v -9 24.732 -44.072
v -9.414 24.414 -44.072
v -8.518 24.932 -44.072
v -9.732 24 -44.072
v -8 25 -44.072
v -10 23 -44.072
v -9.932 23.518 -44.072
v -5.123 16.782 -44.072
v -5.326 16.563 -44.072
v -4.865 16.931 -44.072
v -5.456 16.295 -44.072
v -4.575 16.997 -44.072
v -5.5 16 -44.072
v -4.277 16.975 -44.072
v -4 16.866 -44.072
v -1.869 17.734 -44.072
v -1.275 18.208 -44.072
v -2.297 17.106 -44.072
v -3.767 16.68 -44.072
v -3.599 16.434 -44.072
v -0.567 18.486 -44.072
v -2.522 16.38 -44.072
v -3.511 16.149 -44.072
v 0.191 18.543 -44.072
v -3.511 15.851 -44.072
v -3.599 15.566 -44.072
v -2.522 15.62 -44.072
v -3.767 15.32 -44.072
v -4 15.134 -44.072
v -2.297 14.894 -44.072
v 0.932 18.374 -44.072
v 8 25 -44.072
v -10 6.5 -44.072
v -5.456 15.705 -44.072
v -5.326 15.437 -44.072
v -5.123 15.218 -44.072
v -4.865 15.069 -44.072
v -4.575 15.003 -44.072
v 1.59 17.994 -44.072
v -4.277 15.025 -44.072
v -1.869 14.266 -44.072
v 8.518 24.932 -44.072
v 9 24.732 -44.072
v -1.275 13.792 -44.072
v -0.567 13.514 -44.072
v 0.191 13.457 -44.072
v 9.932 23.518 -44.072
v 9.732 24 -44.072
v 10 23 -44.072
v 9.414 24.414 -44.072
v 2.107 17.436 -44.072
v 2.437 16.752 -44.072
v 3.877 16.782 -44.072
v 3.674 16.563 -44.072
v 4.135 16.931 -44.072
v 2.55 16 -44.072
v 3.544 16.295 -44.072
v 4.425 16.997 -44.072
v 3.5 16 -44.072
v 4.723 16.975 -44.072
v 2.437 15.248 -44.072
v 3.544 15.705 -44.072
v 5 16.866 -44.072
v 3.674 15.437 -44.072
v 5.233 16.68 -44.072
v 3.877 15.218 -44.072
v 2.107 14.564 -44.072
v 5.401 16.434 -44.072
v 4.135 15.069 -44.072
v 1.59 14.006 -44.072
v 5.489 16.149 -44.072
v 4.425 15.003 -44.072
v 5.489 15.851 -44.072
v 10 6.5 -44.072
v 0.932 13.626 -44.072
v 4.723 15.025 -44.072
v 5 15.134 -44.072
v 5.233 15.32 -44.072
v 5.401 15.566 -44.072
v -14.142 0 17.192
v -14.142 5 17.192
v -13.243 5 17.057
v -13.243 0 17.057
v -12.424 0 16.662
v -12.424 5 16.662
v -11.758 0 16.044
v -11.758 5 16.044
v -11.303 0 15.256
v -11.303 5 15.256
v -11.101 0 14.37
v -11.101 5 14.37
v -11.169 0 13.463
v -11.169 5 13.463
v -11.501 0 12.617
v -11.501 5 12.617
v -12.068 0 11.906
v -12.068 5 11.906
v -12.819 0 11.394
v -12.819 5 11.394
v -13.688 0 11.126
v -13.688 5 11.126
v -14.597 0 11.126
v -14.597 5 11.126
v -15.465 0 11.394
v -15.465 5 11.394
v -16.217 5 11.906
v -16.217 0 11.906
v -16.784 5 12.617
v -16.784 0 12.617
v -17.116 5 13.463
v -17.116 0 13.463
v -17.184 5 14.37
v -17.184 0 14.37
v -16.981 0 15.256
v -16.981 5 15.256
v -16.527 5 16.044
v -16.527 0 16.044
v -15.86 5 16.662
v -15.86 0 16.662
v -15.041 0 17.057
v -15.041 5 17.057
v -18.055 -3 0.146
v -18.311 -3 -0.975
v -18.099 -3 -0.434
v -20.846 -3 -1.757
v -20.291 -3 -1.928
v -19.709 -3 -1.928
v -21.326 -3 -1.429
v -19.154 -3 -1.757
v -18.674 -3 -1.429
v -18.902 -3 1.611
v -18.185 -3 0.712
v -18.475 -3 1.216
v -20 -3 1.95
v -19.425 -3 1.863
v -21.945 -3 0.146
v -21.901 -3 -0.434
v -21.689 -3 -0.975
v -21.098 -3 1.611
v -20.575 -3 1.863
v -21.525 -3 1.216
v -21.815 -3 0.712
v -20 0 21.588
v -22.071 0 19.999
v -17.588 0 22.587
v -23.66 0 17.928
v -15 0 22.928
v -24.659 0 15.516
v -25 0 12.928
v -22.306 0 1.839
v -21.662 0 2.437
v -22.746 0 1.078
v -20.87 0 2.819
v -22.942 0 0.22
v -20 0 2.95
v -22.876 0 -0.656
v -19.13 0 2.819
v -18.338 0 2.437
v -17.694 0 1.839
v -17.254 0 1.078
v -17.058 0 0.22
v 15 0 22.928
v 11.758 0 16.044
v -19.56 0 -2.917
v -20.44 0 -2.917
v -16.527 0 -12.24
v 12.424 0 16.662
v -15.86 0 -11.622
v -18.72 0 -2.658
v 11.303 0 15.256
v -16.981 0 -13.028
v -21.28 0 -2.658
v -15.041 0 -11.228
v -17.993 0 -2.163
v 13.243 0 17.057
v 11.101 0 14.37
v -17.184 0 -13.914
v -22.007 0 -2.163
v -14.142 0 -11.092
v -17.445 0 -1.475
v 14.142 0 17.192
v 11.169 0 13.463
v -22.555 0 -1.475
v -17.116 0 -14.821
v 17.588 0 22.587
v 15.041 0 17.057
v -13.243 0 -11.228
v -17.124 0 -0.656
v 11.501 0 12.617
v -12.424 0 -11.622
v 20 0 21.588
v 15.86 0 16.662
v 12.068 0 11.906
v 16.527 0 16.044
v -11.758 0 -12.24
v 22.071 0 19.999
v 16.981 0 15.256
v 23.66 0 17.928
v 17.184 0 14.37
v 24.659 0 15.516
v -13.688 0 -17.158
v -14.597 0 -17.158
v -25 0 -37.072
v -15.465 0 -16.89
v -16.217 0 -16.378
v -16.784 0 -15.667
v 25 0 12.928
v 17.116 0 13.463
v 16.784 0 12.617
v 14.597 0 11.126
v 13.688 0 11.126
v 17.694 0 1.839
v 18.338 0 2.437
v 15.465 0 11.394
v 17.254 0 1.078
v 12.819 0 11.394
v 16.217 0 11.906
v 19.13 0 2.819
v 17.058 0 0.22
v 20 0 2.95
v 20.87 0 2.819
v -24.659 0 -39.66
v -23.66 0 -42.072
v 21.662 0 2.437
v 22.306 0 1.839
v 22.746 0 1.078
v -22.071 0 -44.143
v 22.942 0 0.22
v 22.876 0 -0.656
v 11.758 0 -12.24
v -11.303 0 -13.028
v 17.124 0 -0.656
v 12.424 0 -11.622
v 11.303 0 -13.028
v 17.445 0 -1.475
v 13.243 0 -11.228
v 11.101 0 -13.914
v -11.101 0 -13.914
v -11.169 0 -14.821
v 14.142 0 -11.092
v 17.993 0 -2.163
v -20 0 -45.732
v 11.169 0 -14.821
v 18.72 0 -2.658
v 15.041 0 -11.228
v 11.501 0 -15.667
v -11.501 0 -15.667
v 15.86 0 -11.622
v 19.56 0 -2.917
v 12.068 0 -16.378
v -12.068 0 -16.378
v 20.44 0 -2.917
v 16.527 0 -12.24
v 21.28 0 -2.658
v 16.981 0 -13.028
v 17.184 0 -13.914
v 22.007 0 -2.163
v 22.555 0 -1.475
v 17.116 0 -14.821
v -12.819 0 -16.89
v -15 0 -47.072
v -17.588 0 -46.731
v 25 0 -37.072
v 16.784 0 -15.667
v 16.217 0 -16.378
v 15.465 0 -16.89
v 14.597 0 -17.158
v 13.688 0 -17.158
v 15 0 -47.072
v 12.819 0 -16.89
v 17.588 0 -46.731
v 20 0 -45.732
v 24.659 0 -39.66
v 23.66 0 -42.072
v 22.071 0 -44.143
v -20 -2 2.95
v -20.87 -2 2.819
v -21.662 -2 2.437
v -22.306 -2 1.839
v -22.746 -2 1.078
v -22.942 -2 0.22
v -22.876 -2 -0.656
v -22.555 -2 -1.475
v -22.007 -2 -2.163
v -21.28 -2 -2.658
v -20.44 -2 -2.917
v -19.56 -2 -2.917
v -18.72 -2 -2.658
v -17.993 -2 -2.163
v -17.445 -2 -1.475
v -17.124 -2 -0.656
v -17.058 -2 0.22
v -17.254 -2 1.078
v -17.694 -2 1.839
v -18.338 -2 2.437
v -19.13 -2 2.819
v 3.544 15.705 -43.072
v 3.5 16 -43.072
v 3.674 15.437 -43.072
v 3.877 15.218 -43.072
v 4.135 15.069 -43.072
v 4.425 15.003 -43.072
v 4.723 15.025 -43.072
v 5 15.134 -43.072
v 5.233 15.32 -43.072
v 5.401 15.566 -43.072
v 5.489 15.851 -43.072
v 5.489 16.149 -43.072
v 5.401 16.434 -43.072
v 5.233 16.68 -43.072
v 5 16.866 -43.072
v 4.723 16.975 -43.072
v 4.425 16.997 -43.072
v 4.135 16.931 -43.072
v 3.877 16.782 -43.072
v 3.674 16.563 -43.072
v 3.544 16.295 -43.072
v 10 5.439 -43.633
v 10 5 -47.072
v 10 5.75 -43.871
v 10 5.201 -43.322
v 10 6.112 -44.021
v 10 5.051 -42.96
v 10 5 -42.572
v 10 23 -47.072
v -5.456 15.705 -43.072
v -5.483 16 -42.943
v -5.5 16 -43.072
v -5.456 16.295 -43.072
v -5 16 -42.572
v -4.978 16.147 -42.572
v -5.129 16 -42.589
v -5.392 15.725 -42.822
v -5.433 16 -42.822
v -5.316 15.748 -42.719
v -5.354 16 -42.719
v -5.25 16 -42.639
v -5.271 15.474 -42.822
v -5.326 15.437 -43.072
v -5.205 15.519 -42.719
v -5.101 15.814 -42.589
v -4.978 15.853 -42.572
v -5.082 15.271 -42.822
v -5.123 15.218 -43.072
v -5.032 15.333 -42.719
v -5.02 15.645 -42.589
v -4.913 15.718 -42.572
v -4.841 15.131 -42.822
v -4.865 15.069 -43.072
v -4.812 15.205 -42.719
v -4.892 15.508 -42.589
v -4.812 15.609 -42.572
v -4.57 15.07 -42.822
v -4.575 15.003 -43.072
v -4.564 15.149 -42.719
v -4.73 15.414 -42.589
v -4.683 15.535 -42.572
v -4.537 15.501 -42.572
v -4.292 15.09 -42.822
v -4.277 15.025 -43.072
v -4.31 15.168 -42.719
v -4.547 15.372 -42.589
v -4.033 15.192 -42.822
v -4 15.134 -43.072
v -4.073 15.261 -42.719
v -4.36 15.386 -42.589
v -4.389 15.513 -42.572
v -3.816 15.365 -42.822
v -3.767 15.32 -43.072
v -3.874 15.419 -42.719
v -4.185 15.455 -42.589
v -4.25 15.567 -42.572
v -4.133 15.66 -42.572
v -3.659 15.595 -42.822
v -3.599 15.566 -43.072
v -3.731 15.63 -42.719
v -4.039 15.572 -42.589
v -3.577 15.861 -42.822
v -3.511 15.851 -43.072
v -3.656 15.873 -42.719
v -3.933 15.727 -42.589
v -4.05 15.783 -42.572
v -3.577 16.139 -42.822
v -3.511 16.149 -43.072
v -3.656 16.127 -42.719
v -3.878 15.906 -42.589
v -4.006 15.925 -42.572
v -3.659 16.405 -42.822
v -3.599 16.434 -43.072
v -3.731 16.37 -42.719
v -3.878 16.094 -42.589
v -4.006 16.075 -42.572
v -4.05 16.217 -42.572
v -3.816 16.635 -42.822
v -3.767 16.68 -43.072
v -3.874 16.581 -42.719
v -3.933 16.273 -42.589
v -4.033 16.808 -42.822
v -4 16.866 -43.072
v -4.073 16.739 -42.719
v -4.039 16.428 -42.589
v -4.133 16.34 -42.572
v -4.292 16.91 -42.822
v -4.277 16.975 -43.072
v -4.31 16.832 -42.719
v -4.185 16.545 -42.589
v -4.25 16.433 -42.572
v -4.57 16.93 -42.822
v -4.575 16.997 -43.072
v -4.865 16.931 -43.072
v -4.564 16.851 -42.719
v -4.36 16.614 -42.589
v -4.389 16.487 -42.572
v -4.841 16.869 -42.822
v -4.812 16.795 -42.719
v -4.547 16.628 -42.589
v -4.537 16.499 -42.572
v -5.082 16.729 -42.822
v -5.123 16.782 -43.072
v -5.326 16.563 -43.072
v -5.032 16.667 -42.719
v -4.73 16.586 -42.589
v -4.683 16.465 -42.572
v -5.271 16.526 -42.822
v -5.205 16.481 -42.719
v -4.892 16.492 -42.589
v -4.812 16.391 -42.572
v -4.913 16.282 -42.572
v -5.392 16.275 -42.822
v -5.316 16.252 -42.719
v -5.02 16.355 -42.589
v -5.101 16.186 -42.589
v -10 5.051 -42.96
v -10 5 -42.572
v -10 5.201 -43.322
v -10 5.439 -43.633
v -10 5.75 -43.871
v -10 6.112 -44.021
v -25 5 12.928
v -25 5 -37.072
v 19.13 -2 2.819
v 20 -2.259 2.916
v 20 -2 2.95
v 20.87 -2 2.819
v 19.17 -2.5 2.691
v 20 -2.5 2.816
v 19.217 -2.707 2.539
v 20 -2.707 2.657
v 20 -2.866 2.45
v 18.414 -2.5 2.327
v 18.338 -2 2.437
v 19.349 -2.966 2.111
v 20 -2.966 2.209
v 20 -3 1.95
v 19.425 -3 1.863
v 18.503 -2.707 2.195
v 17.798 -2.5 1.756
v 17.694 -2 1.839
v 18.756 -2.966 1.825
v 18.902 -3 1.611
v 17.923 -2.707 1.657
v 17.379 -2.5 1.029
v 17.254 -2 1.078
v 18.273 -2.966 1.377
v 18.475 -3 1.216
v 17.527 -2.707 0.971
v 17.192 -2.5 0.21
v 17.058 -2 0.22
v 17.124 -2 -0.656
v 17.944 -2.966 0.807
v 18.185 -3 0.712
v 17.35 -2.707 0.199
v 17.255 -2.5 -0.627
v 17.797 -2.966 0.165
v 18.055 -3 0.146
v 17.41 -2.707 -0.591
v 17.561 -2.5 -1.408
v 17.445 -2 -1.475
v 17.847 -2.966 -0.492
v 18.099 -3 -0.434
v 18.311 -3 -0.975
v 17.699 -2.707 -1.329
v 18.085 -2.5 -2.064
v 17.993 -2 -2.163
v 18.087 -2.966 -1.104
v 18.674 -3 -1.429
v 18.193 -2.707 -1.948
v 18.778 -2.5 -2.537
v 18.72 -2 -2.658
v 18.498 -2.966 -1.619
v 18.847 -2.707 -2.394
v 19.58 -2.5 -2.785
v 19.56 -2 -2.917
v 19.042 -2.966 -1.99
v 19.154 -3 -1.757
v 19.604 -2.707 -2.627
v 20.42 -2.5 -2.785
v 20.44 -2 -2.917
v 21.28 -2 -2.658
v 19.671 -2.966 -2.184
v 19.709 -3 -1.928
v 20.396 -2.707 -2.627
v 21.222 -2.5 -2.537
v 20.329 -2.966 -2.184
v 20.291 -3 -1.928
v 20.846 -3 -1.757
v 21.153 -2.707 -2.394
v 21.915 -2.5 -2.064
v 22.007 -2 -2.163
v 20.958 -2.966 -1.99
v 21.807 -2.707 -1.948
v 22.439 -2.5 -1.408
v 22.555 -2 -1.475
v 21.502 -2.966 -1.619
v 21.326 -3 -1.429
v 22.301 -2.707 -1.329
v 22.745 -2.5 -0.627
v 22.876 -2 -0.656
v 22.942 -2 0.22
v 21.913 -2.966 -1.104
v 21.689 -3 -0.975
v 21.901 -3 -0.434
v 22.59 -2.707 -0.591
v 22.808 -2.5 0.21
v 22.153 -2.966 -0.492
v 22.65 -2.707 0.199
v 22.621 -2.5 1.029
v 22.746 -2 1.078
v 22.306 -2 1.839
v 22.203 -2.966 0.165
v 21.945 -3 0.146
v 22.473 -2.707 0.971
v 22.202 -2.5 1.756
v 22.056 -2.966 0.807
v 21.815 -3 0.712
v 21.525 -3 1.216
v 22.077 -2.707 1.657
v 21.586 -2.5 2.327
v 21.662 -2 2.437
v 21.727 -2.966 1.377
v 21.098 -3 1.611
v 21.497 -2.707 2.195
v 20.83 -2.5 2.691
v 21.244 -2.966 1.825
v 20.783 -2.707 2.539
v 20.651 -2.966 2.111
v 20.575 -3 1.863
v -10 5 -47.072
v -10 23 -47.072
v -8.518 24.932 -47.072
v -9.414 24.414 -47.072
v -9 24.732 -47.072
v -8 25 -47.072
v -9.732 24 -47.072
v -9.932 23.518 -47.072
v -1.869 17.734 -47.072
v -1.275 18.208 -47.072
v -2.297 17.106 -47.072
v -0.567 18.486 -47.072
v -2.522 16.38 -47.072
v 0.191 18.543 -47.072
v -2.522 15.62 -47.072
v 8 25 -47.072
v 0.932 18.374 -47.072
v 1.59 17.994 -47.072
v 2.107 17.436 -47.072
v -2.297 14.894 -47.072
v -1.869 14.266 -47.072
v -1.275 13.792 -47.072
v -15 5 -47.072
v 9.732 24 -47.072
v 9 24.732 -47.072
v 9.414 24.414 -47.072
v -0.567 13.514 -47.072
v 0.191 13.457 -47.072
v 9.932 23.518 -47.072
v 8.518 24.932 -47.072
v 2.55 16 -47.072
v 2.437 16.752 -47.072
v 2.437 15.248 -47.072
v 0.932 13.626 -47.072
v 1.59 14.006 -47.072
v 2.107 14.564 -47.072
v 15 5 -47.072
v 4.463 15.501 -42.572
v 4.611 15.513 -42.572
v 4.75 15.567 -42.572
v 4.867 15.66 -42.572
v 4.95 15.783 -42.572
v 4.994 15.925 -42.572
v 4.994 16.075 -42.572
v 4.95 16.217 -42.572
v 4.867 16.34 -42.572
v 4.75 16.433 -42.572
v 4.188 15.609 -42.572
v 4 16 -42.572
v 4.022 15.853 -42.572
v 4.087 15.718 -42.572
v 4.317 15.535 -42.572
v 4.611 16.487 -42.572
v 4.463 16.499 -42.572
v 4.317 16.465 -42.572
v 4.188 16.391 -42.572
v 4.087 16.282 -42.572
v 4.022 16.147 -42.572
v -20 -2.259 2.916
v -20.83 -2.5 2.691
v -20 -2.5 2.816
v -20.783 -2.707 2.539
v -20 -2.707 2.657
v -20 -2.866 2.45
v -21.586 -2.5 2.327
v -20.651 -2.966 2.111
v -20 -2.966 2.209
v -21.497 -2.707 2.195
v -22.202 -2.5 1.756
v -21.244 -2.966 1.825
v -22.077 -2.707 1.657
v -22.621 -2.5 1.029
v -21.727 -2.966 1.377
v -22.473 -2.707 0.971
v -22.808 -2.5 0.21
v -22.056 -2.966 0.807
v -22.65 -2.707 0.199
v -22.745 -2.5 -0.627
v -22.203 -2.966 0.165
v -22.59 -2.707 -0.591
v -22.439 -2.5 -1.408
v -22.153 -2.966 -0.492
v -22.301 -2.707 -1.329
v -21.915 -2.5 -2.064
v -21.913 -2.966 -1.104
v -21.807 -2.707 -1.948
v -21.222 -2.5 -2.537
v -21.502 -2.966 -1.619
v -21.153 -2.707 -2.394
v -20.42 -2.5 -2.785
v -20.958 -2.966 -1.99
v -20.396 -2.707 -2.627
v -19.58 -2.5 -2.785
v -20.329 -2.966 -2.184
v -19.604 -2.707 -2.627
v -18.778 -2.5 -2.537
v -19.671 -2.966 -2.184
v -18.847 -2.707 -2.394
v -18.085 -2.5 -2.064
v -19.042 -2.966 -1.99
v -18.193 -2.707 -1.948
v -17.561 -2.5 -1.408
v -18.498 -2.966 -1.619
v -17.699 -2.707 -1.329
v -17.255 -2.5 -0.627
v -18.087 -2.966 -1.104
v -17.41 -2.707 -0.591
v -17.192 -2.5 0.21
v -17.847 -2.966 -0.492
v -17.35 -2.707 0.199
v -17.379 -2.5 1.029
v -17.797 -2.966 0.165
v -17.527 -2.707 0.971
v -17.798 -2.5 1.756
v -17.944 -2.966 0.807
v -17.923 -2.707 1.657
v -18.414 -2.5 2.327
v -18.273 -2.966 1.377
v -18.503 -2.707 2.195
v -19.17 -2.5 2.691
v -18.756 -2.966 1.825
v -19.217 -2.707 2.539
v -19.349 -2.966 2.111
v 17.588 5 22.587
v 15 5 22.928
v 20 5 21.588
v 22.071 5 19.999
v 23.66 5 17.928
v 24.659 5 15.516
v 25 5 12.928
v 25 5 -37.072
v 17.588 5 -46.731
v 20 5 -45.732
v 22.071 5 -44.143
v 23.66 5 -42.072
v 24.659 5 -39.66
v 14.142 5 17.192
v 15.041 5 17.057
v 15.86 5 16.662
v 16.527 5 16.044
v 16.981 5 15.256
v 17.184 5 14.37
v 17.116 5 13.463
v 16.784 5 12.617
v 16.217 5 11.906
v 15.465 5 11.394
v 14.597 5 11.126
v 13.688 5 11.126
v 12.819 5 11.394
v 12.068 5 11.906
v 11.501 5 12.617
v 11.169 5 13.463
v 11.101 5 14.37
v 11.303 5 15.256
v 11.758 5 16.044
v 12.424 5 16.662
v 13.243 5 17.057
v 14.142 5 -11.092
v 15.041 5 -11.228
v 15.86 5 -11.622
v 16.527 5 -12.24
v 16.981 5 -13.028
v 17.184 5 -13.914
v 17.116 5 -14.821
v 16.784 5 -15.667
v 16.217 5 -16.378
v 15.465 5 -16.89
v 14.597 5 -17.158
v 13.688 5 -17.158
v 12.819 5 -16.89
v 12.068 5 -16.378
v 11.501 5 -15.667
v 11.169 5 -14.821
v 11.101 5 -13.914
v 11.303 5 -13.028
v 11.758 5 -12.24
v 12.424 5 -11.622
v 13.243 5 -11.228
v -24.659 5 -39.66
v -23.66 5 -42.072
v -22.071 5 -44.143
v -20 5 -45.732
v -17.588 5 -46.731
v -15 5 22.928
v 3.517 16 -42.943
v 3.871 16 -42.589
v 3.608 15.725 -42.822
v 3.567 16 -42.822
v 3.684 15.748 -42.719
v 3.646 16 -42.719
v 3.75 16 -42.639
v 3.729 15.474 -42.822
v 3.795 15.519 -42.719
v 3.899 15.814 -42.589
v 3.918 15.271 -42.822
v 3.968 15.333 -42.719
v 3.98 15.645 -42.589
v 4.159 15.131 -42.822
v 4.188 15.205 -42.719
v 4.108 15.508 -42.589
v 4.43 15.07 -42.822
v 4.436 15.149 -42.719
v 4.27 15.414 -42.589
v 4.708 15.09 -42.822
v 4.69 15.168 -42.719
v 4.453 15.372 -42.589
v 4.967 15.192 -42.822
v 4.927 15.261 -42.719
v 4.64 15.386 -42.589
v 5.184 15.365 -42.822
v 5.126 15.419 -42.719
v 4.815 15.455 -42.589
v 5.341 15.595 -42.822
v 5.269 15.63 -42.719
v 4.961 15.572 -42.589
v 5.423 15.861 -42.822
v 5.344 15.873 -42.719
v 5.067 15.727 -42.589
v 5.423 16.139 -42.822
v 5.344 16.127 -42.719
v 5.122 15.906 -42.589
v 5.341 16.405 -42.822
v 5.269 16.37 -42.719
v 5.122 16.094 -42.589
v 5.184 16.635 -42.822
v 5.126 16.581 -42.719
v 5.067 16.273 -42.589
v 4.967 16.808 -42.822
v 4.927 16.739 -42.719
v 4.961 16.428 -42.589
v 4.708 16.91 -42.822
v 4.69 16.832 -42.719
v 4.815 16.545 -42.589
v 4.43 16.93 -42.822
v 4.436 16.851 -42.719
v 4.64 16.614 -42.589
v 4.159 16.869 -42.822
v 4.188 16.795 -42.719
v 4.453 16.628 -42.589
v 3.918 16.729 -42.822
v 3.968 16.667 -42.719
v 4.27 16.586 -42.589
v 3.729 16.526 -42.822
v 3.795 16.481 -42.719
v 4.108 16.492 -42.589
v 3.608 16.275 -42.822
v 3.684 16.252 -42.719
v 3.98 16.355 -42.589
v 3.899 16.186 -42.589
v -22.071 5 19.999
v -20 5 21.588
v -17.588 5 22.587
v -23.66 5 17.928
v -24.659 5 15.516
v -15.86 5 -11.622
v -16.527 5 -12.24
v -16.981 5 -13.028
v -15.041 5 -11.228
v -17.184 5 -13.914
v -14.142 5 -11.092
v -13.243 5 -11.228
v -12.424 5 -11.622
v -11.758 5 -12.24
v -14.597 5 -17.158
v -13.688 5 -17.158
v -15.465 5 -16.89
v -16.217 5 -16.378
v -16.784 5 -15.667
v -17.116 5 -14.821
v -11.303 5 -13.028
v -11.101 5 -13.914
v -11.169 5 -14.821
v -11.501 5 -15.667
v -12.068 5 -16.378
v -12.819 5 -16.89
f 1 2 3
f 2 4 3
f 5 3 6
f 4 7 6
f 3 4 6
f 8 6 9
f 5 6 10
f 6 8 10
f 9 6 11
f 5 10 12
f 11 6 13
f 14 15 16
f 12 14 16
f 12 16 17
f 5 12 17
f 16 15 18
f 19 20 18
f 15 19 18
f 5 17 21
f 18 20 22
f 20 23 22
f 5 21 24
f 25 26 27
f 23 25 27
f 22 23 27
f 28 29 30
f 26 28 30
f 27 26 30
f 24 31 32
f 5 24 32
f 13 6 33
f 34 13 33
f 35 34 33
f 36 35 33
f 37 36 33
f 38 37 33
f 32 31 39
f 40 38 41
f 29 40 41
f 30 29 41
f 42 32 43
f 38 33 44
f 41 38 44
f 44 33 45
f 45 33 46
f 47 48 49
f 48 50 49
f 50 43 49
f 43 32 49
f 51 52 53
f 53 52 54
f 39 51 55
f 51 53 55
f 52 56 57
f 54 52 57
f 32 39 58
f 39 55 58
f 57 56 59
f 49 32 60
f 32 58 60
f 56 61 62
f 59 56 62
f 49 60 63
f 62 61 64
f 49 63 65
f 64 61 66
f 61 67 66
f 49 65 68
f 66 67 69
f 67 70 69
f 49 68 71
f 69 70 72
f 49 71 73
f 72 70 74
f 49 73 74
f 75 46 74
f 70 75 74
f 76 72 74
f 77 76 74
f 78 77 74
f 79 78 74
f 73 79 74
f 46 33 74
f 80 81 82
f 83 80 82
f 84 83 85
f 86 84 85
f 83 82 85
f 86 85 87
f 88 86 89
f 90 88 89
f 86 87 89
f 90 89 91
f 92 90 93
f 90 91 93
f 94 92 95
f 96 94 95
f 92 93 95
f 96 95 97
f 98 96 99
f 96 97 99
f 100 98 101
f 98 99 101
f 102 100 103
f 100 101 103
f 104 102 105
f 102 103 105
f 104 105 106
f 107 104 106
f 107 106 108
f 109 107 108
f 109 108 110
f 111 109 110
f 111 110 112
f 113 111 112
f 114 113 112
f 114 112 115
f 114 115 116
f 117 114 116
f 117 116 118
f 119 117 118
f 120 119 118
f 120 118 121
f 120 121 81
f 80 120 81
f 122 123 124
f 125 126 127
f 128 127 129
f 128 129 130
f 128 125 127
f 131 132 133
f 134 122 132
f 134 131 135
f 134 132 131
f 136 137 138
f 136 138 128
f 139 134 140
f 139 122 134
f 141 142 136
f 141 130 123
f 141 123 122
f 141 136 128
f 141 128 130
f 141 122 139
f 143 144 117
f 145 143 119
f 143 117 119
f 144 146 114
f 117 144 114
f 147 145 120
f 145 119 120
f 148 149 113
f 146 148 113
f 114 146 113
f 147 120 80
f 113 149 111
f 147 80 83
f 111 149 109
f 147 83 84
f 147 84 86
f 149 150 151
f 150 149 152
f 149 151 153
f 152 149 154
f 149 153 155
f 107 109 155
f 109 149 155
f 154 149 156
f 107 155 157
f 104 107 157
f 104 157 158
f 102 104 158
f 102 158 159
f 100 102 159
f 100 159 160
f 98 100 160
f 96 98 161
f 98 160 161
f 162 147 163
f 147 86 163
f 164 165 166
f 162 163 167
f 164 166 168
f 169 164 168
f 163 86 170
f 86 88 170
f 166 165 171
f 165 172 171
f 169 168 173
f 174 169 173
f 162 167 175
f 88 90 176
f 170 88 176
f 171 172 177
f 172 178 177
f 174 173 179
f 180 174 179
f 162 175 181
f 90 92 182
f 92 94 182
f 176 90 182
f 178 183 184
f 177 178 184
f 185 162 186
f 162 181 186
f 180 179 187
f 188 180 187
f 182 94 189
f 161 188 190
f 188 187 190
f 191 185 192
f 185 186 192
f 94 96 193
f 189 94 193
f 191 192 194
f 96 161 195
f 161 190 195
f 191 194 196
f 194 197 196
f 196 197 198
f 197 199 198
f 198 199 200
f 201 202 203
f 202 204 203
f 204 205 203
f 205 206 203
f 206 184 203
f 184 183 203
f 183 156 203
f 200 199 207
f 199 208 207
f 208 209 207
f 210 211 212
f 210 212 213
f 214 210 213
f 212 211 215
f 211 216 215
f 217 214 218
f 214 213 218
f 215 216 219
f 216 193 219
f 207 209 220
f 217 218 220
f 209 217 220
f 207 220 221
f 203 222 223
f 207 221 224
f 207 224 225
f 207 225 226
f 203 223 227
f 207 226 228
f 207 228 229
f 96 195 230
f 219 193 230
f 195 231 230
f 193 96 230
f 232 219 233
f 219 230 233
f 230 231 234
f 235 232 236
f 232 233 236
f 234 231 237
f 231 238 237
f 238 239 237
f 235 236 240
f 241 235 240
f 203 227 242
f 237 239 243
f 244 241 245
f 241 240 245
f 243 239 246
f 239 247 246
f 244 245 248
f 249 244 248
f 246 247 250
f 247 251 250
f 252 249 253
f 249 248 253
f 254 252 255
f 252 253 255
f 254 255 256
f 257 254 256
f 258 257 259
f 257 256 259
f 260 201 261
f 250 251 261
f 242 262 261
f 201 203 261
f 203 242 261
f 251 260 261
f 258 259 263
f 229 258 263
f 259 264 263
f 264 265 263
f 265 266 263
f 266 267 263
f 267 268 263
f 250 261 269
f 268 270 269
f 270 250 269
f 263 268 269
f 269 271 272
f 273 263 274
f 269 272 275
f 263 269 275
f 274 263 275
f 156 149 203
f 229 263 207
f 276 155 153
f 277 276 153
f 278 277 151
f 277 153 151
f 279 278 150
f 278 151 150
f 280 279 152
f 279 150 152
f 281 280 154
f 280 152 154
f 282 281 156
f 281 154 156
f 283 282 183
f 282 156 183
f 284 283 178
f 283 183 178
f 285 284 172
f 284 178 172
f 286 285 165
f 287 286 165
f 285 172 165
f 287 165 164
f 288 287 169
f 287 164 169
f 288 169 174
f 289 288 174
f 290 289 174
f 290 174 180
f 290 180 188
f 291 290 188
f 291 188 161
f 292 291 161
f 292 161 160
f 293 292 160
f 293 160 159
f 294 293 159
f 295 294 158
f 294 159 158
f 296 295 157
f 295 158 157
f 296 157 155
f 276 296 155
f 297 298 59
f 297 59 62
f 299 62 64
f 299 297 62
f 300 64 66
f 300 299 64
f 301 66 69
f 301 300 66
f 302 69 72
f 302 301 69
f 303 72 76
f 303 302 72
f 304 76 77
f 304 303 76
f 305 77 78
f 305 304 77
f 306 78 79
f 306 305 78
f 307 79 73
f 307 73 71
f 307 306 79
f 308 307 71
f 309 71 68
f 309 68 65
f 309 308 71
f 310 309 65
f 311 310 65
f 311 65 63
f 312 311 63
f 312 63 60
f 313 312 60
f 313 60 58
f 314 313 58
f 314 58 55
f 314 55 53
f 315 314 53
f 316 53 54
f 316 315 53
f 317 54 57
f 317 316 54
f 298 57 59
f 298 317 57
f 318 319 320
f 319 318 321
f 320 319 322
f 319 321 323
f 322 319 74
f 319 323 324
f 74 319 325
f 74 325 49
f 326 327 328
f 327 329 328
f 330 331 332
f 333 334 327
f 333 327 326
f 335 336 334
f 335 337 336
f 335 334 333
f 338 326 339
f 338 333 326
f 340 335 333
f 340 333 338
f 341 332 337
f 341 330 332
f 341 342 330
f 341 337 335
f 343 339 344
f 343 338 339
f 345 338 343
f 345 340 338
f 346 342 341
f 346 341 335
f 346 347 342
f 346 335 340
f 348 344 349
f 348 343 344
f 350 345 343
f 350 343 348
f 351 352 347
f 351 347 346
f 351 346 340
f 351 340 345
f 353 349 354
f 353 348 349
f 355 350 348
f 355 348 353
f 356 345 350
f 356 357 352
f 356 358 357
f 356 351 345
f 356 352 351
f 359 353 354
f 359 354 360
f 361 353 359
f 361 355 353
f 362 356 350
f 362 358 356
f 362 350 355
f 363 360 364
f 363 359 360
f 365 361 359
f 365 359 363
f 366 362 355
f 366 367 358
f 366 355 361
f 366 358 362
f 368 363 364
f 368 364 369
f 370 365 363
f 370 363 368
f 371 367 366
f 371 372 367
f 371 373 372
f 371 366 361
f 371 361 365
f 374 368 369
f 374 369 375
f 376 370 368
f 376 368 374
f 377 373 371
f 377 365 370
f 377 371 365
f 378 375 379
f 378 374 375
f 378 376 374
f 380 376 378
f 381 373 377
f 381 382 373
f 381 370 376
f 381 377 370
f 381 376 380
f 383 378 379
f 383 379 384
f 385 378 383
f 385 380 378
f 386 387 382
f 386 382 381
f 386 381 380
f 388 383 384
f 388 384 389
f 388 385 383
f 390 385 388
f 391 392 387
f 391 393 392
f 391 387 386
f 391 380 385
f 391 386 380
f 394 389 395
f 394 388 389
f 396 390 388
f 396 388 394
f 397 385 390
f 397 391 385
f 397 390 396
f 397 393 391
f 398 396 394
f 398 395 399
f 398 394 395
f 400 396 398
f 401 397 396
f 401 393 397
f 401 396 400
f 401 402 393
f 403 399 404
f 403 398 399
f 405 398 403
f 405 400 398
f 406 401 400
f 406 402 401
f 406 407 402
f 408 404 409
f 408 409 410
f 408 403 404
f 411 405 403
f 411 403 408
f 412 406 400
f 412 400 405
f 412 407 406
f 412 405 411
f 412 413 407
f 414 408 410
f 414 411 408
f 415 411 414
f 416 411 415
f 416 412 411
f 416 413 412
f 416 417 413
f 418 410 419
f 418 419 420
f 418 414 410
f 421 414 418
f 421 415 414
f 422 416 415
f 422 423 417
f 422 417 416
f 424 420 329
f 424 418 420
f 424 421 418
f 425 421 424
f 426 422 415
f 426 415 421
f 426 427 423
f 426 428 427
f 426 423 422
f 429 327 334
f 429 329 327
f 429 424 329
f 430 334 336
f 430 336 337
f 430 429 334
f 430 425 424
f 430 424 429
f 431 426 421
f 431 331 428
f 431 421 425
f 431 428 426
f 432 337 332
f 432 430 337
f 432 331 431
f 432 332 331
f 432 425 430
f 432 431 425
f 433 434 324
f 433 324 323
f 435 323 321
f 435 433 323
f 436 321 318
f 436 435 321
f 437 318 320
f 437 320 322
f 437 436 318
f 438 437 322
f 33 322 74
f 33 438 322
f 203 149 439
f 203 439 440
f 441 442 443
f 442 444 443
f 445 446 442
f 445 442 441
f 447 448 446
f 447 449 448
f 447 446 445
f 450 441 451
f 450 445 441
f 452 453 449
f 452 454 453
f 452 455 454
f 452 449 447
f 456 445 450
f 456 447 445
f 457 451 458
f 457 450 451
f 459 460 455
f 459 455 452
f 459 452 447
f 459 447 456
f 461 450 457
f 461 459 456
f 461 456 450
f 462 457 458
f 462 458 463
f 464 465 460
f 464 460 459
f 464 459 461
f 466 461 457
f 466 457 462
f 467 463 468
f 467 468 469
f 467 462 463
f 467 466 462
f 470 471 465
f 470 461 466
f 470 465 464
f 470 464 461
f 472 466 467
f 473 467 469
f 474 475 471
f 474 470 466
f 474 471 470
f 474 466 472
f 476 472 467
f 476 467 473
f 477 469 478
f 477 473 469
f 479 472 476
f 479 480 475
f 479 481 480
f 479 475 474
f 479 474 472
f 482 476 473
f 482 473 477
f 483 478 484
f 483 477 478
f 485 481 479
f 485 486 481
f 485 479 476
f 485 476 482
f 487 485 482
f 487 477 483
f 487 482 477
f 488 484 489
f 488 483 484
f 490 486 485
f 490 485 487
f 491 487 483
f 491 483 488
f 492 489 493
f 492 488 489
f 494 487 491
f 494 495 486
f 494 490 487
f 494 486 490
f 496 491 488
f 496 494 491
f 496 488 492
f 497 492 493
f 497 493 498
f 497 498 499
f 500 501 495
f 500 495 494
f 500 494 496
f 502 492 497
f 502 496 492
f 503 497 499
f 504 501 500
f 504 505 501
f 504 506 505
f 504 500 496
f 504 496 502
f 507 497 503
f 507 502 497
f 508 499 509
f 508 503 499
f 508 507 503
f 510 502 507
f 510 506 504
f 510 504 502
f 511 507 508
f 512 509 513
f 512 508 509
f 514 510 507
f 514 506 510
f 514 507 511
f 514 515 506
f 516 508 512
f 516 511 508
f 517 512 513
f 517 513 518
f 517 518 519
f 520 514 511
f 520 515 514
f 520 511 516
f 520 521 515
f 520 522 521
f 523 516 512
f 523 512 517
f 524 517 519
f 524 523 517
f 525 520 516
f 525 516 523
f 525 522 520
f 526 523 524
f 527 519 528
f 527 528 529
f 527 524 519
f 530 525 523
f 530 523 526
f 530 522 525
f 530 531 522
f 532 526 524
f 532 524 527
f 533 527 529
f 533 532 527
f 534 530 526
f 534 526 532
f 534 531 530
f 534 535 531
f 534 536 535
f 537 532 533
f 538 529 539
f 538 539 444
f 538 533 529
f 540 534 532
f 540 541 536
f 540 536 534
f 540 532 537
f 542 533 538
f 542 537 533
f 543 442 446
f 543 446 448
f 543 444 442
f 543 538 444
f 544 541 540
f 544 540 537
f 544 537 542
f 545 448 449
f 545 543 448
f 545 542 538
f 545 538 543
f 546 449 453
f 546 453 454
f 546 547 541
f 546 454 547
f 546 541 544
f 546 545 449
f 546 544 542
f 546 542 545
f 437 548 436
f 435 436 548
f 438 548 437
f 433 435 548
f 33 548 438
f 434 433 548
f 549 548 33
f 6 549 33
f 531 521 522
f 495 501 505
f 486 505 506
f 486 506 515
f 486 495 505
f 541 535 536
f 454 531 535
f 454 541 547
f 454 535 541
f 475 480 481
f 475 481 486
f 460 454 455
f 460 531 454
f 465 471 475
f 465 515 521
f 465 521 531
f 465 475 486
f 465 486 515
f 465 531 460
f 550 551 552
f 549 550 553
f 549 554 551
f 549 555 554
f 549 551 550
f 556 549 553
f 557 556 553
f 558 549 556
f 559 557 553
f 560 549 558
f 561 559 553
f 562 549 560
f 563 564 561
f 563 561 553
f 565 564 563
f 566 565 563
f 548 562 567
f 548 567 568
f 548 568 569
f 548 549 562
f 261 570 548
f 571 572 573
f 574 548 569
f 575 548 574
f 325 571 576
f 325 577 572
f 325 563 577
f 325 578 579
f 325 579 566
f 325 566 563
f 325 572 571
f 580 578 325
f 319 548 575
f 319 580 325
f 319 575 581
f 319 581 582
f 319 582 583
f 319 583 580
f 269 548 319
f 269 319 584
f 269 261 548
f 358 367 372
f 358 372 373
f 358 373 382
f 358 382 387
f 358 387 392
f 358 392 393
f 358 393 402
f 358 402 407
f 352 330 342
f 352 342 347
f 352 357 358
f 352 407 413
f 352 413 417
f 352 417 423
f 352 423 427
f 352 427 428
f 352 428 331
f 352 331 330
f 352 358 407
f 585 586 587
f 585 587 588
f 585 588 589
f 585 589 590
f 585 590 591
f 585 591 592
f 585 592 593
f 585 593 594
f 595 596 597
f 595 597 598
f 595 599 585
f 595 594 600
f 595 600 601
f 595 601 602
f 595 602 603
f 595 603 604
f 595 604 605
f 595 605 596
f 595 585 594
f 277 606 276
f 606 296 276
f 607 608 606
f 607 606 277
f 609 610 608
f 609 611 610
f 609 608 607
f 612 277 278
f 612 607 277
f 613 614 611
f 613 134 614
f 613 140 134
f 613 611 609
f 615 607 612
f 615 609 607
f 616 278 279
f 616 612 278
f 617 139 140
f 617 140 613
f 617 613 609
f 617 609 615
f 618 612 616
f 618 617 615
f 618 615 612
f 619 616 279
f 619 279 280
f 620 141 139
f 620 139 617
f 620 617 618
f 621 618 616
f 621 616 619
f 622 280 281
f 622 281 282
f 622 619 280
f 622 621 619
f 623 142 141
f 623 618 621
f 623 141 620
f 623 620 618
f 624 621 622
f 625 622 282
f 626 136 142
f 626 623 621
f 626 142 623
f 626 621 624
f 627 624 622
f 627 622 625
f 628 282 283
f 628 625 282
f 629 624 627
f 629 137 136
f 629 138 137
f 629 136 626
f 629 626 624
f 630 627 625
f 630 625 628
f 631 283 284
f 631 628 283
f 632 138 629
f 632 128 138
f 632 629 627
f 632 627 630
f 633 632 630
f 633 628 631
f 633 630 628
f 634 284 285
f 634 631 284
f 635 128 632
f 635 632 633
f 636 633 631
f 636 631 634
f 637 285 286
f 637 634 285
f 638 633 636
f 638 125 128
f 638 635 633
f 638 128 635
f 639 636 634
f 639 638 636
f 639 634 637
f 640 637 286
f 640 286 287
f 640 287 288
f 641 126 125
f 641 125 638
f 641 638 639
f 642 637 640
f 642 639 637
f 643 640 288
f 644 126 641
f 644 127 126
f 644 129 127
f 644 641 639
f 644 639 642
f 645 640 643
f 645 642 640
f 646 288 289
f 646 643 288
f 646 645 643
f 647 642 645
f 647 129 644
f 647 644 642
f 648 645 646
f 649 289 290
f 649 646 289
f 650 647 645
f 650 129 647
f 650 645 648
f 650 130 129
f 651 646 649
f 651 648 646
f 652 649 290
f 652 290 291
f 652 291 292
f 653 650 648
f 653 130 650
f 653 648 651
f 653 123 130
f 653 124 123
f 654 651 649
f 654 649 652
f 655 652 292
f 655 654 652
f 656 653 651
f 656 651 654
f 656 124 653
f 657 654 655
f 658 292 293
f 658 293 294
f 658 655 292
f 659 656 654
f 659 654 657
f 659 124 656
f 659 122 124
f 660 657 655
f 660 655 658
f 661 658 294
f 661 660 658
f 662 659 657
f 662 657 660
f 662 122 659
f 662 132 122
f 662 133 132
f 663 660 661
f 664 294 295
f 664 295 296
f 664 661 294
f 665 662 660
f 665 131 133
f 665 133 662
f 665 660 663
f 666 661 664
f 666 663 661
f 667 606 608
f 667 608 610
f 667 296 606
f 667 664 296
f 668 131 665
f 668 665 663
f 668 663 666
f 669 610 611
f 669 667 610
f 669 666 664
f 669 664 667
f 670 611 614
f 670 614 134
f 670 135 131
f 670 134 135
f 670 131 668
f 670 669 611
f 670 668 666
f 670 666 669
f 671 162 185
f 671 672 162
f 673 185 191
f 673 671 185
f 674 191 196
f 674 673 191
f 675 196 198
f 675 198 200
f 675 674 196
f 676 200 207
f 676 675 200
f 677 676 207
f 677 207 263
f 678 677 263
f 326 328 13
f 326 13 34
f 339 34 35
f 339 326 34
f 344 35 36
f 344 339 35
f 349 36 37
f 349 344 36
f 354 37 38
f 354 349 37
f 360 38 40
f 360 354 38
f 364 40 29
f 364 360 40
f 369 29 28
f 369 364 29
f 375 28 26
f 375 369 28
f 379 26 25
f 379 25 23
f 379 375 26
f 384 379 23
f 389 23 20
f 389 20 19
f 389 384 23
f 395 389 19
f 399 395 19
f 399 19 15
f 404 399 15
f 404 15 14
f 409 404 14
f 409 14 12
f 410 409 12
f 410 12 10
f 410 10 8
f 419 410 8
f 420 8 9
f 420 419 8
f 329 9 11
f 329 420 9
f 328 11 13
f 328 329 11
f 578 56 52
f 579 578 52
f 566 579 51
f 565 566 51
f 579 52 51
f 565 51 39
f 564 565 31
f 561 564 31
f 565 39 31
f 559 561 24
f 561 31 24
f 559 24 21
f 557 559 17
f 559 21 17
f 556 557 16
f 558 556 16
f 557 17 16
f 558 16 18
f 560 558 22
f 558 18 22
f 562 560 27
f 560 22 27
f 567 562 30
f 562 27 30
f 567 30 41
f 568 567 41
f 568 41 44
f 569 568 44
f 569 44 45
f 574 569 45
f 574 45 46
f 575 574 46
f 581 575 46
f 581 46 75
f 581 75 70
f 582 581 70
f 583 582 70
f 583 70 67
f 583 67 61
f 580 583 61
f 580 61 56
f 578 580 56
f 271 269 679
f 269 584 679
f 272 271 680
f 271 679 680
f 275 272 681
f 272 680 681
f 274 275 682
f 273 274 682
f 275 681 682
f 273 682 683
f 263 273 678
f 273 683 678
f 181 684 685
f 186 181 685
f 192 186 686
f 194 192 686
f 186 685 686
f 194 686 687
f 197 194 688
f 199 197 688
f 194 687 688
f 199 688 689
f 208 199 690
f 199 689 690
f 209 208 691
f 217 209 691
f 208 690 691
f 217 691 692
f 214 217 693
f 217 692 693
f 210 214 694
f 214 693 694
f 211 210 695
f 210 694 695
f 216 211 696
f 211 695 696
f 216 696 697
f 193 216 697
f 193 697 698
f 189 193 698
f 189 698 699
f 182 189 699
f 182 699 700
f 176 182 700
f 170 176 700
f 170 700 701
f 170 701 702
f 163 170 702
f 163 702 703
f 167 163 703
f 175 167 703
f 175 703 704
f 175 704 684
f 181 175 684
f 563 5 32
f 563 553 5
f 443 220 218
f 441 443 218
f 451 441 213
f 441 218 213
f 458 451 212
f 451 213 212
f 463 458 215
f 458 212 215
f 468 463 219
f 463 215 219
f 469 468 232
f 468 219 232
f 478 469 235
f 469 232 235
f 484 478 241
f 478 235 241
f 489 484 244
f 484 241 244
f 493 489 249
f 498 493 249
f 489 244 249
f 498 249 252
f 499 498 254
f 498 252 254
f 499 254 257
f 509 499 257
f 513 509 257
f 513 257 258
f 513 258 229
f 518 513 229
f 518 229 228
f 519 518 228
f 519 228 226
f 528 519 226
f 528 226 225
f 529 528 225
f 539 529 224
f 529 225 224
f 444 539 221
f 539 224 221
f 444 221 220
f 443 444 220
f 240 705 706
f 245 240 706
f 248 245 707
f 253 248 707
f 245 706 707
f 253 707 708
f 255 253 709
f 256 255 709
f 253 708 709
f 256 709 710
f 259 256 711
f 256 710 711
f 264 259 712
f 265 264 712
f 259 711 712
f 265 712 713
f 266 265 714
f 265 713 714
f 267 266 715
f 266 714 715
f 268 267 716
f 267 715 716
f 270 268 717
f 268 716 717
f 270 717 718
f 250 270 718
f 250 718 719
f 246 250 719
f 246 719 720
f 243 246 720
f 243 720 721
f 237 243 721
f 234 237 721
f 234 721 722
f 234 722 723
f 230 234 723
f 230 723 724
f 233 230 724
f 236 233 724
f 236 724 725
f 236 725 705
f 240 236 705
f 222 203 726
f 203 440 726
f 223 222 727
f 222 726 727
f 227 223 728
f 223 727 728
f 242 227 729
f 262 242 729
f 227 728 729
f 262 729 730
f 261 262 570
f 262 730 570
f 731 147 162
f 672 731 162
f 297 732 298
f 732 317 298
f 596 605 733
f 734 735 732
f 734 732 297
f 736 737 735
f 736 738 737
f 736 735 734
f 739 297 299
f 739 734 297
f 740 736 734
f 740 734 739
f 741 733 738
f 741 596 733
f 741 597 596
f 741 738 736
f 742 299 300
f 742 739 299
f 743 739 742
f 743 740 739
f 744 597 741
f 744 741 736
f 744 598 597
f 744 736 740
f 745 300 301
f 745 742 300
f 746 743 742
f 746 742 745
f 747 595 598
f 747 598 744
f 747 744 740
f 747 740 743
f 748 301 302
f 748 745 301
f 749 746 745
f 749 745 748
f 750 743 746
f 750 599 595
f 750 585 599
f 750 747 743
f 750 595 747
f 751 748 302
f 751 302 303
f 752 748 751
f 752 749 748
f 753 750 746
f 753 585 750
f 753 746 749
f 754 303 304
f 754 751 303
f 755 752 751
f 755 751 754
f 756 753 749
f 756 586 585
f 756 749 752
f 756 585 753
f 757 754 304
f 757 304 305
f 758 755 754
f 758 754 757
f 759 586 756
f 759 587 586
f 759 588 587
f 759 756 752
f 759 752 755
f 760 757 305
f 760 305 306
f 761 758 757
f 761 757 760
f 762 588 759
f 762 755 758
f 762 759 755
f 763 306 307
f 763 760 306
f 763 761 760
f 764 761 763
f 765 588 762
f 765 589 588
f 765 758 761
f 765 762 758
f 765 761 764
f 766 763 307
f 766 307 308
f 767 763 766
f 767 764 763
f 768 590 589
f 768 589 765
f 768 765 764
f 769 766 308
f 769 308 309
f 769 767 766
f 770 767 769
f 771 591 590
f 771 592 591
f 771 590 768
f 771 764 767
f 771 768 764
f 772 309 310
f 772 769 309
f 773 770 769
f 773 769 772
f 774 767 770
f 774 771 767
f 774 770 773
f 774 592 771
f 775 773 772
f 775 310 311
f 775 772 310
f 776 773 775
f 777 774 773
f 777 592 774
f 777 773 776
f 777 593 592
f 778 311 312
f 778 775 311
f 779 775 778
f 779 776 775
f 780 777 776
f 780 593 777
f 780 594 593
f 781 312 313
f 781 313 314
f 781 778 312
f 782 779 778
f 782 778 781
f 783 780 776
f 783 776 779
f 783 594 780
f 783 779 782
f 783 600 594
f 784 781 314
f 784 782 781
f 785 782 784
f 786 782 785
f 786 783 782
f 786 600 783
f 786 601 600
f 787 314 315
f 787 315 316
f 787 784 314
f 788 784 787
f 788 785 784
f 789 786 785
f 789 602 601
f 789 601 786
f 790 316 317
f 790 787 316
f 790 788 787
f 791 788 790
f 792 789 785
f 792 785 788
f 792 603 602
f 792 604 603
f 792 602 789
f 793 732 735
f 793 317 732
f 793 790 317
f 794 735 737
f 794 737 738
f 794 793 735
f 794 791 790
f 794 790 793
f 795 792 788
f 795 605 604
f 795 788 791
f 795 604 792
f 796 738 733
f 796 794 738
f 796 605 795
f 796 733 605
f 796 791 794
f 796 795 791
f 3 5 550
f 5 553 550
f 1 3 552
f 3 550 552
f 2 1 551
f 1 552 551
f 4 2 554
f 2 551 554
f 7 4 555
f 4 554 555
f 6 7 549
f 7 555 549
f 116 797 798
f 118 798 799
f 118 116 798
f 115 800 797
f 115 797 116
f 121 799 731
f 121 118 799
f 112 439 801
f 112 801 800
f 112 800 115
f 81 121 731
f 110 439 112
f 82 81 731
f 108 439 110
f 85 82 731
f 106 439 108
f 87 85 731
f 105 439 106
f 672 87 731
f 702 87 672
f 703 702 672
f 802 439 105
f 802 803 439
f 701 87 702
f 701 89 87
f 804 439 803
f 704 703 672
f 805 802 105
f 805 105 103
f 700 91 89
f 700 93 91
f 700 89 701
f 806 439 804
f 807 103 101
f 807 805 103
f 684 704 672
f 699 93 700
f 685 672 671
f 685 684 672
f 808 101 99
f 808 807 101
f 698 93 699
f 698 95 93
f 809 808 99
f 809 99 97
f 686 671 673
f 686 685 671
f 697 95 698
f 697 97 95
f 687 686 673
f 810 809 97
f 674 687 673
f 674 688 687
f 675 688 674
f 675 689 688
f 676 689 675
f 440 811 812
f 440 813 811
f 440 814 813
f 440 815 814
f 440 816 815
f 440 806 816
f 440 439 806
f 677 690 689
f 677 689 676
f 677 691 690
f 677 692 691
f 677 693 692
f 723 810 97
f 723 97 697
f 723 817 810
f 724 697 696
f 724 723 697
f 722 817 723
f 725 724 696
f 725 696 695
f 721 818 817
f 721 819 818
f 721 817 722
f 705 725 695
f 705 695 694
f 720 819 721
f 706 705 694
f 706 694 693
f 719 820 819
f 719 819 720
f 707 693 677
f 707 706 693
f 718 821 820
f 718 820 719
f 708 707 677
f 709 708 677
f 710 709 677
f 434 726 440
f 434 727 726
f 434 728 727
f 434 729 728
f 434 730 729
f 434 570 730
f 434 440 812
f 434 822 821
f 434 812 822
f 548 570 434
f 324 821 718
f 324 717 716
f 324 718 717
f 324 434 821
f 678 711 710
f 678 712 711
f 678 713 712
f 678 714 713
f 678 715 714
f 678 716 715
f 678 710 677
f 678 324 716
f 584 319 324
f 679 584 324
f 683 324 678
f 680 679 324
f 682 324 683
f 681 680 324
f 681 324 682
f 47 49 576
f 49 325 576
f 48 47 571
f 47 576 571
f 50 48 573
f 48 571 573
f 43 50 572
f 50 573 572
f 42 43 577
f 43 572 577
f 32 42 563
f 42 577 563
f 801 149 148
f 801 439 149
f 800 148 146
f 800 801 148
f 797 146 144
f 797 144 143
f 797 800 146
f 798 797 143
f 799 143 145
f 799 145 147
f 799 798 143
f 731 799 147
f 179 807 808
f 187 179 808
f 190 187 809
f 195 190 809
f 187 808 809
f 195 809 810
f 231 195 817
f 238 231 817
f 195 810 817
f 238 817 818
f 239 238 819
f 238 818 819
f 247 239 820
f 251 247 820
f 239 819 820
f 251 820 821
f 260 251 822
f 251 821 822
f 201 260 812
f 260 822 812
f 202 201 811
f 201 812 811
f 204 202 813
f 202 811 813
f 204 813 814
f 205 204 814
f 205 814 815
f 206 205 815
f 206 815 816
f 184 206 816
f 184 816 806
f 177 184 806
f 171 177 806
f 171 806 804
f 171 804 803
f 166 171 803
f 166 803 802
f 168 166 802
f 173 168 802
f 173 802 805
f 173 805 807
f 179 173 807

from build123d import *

# Parameters (mm, degrees)
SKETCH_1_W          = 50
SKETCH_1_H          = 70
EXTRUDE_1_DEPTH     = 5
SKETCH_2_R          = 3.05
CUT_EXTRUDE_1_DEPTH = 54.53308254
SKETCH_4_R          = 2.95
EXTRUDE_2_DEPTH     = 3
FILLET_1_R          = 1
FILLET_2_R          = 10
SKETCH_6_W          = 20
SKETCH_6_H          = 3
EXTRUDE_3_DEPTH     = 20
EXTRUDE_5_DEPTH     = 20
FILLET_3_R          = 2
SKETCH_9_R          = 2.55
CUT_EXTRUDE_2_DEPTH = 76.756187866
SKETCH_9_4_R        = 1
EXTRUDE_6_DEPTH     = 1.5
FILLET_4_R          = 0.5


with BuildPart() as part:
    # 草图1 → 凸台-拉伸1 (new body)
    with BuildSketch(Plane(origin=(0, 0, 0), x_dir=(1, 0, 0), z_dir=(0, 1, 0))):
        with Locations((0, 12.072188459)):
            Rectangle(SKETCH_1_W, SKETCH_1_H)
    extrude(amount=EXTRUDE_1_DEPTH)

    # 草图2 → 切除-拉伸1 (cut, through all)
    with BuildSketch(Plane(origin=(0, 5, 0), x_dir=(1, 0, 0), z_dir=(0, 1, 0))):
        with Locations((14.142135624, 14.142135624)):
            Circle(SKETCH_2_R)
        with Locations((14.142135624, -14.142135624)):
            Circle(SKETCH_2_R)
        with Locations((-14.142135624, -14.142135624)):
            Circle(SKETCH_2_R)
        with Locations((-14.142135624, 14.142135624)):
            Circle(SKETCH_2_R)
    extrude(amount=-CUT_EXTRUDE_1_DEPTH, mode=Mode.SUBTRACT)

    # 草图4 → 凸台-拉伸2 (add)
    with BuildSketch(Plane.XZ):
        with Locations((20, 0)):
            Circle(SKETCH_4_R)
        with Locations((-20, 0)):
            Circle(SKETCH_4_R)
    extrude(amount=EXTRUDE_2_DEPTH)

    # 圆角1
    fillet_1_edges = [part.edges().sort_by_distance(p)[0] for p in [
        (-22.95, -3, 0),
        (17.05, -3, 0),
    ]]
    fillet(fillet_1_edges, radius=FILLET_1_R)

    # 圆角2
    fillet_2_edges = [part.edges().sort_by_distance(p)[0] for p in [
        (-25, 2.5, -47.072188459),
        (25, 2.5, -47.072188459),
        (-25, 2.5, 22.927811541),
        (25, 2.5, 22.927811541),
    ]]
    fillet(fillet_2_edges, radius=FILLET_2_R)

    # 草图6 → 凸台-拉伸3 (add)
    with BuildSketch(Plane(origin=(0, 5, 0), x_dir=(1, 0, 0), z_dir=(0, 1, 0))):
        with Locations((0, 45.572188459)):
            Rectangle(SKETCH_6_W, SKETCH_6_H)
    extrude(amount=EXTRUDE_3_DEPTH)

    # 草图8 → 凸台-拉伸5 (add)
    with BuildSketch(Plane.ZY.offset(10)):
        with BuildLine():
            Line((-44.072188459, 6.5), (-44.072188459, 5))
            Line((-44.072188459, 5), (-42.572188459, 5))
            ThreePointArc((-42.572188459, 5), (-43.63284863, 5.439339828), (-44.072188459, 6.5))
        make_face()
    extrude(amount=-EXTRUDE_5_DEPTH)

    # 圆角3
    fillet_3_edges = [part.edges().sort_by_distance(p)[0] for p in [
        (-10, 25, -45.572188459),
        (10, 25, -45.572188459),
    ]]
    fillet(fillet_3_edges, radius=FILLET_3_R)

    # 草图9 → 切除-拉伸2 (cut, through all)
    with BuildSketch(Plane.XY.offset(-44.072188459)):
        with Locations((0, 16)):
            Circle(SKETCH_9_R)
    extrude(amount=-CUT_EXTRUDE_2_DEPTH, mode=Mode.SUBTRACT)

    # 草图9<4> → 凸台-拉伸6 (add)
    with BuildSketch(Plane.XY.offset(-44.072188459)):
        with Locations((-4.5, 16)):
            Circle(SKETCH_9_4_R)
        with Locations((4.5, 16)):
            Circle(SKETCH_9_4_R)
    extrude(amount=EXTRUDE_6_DEPTH)

    # 圆角4
    fillet_4_edges = [part.edges().sort_by_distance(p)[0] for p in [
        (3.5, 16, -42.572188459),
        (-5.5, 16, -42.572188459),
    ]]
    fillet(fillet_4_edges, radius=FILLET_4_R)


solid = part.part
